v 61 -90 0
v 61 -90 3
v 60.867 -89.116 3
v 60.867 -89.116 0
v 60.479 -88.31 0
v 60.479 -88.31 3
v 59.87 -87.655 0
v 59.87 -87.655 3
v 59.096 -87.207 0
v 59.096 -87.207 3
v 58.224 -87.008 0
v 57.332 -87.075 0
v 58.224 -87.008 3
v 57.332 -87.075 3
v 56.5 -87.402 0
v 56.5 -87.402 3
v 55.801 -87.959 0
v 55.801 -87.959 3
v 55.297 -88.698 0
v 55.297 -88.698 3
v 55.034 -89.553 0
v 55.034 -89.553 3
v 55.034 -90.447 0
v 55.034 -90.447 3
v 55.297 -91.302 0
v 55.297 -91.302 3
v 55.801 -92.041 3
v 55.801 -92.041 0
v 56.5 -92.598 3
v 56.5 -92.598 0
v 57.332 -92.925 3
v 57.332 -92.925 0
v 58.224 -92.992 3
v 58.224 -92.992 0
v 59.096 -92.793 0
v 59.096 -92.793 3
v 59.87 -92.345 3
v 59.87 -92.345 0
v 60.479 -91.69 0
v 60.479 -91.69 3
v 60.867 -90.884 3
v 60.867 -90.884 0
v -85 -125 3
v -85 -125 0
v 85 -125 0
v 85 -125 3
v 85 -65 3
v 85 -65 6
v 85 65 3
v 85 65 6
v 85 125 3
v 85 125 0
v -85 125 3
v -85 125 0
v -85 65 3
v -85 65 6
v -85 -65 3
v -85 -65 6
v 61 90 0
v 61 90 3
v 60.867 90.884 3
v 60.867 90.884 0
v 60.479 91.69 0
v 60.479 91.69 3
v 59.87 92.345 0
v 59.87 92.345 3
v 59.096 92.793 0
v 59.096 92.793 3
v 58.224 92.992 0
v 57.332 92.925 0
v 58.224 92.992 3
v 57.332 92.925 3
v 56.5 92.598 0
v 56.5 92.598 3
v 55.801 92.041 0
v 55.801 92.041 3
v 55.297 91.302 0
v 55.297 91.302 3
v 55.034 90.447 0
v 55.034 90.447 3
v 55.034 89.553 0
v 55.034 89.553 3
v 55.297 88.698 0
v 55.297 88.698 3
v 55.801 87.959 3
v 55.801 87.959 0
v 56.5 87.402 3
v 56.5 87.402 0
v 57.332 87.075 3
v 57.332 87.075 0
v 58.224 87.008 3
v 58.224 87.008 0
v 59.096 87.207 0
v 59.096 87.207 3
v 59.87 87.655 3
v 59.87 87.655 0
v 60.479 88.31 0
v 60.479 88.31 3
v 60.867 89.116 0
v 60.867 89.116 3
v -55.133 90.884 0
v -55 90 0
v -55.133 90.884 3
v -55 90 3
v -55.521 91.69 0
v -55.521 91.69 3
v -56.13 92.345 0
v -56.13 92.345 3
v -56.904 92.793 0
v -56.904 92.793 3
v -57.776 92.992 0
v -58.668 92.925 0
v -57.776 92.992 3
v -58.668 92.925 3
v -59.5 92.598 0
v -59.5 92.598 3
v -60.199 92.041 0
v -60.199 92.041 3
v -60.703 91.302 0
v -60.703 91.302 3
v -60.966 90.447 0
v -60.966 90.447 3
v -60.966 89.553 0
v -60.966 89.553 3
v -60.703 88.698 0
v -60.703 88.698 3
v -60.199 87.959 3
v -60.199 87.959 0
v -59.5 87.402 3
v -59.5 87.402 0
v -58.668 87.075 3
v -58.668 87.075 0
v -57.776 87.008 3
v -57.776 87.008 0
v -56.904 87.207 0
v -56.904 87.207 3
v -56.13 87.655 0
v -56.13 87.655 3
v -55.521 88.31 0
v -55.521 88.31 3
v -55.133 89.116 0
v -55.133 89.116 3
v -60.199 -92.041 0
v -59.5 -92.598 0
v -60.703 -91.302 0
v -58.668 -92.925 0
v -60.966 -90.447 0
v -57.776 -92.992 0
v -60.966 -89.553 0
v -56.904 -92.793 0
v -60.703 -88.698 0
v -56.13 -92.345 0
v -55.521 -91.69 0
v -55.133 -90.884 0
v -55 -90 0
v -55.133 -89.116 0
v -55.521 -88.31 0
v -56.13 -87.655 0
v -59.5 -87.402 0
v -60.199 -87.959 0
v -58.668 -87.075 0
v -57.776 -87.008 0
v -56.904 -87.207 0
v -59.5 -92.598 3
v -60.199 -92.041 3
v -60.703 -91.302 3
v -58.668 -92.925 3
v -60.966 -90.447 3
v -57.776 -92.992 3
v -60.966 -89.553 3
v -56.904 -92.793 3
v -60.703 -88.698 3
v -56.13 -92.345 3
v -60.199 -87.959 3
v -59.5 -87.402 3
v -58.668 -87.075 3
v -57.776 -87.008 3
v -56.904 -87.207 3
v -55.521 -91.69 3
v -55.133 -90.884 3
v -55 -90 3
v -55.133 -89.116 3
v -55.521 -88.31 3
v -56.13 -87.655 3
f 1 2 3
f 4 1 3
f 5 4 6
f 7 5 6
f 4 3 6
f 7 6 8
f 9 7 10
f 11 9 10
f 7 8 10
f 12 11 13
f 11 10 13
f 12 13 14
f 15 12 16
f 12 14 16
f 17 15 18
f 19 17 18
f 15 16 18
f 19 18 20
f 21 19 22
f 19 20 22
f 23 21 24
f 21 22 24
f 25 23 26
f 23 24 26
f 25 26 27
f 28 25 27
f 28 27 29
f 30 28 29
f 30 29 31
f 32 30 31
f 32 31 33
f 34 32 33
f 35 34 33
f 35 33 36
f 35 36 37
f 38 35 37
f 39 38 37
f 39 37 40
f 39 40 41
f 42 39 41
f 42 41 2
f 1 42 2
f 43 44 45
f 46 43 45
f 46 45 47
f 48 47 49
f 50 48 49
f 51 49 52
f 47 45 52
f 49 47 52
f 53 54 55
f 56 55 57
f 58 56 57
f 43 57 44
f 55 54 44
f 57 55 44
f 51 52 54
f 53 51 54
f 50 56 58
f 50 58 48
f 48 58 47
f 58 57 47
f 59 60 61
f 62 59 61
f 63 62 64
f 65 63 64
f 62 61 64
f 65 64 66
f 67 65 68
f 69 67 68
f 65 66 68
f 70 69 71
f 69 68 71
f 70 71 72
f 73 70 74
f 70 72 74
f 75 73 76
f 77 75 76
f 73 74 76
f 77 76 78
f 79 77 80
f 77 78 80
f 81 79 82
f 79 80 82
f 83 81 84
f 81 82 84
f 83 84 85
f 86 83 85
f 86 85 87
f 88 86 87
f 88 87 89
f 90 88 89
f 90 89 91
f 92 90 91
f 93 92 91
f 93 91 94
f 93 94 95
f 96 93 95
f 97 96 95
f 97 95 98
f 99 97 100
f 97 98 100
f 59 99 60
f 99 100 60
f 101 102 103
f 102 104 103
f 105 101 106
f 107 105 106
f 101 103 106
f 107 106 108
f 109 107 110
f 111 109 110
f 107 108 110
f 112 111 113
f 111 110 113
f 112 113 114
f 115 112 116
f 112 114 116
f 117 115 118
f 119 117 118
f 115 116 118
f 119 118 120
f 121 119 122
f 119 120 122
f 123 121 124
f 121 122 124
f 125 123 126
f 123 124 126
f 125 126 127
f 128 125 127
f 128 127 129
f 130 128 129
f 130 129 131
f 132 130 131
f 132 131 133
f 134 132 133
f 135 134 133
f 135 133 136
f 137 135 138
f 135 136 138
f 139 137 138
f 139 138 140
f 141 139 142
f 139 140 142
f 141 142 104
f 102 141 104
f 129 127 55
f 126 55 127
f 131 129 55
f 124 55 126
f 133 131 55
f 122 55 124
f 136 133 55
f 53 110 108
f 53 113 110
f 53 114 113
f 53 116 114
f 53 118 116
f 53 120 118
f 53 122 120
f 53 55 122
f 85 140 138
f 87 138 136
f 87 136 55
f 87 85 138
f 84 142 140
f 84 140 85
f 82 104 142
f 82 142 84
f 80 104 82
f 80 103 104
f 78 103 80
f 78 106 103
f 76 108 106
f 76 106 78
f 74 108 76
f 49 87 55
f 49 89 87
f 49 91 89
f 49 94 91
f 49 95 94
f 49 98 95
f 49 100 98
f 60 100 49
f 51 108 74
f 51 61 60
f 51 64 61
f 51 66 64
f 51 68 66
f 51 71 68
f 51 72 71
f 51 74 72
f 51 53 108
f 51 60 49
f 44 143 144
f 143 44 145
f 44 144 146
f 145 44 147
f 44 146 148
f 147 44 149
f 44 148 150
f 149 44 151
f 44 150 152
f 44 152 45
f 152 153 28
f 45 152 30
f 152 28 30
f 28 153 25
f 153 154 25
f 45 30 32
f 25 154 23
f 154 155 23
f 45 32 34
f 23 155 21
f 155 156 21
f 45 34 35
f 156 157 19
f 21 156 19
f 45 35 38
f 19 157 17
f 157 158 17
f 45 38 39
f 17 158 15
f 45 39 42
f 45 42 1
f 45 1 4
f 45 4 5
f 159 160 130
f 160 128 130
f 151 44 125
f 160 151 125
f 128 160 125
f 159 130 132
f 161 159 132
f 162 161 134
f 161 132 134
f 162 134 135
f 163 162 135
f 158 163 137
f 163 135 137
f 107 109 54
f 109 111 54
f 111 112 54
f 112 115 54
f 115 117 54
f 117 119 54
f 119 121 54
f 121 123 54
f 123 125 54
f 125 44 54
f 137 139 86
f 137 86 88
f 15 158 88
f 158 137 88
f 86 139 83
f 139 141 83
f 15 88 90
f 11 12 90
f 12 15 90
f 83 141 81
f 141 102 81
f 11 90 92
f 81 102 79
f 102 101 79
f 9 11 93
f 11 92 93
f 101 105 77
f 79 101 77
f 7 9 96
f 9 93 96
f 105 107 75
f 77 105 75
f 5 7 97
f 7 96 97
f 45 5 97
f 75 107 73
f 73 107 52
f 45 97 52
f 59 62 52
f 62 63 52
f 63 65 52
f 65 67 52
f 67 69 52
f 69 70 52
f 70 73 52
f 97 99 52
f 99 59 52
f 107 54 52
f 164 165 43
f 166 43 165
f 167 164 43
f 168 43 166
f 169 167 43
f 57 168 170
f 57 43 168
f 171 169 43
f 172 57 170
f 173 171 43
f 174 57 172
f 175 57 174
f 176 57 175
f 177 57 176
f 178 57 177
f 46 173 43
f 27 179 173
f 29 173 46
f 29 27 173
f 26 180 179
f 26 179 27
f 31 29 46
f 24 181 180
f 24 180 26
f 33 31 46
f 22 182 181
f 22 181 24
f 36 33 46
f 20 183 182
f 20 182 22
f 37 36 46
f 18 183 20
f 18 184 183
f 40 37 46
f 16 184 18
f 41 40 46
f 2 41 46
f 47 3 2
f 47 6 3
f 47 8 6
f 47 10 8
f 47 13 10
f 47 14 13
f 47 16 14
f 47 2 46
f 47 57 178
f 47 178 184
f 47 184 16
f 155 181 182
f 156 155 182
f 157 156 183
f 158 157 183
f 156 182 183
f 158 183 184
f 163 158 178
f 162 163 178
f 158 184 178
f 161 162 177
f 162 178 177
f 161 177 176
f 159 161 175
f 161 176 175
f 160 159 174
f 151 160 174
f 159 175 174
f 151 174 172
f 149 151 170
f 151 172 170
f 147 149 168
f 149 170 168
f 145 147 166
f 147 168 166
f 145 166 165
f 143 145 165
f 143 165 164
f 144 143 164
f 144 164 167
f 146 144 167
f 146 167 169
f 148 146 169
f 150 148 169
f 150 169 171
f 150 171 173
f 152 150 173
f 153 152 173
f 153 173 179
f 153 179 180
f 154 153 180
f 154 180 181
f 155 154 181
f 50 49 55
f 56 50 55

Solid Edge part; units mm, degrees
sketch "Sketch1" plane through (0, 0, 0) normal (0, 0, 1) x (1, 0, 0)
  line L0 (-85, -125) -> (85, -125)
  line L1 (85, -125) -> (85, 125)
  line L2 (85, 125) -> (-85, 125)
  line L3 (-85, 125) -> (-85, -125)
  dimension "D1" = 170
  dimension "D2" = 250
extrude "Protrusion1" add sketch "Sketch1" along normal blind 3
sketch "Sketch2" plane through (0, 0, 3) normal (0, 0, 1) x (1, 0, 0)
  circle A0 centre (-58, 90) radius 3
  circle A1 centre (58, 90) radius 3
  circle A2 centre (58, -90) radius 3
  circle A3 centre (-58, -90) radius 3
  dimension "D1" = 58
  dimension "D2" = 58
extrude "Cutout1" cut sketch "Sketch2" against normal through all
sketch "Sketch3" plane through (0, 0, 3) normal (0, 0, 1) x (1, 0, 0)
  line L0 (-85, -65) -> (85, -65)
  line L1 (85, -65) -> (85, 65)
  line L2 (85, 65) -> (-85, 65)
  line L3 (-85, 65) -> (-85, -65)
extrude "Extrusionsausprägung_2" add sketch "Sketch3" along normal blind 3
properties material "Nylon, allgemein"
